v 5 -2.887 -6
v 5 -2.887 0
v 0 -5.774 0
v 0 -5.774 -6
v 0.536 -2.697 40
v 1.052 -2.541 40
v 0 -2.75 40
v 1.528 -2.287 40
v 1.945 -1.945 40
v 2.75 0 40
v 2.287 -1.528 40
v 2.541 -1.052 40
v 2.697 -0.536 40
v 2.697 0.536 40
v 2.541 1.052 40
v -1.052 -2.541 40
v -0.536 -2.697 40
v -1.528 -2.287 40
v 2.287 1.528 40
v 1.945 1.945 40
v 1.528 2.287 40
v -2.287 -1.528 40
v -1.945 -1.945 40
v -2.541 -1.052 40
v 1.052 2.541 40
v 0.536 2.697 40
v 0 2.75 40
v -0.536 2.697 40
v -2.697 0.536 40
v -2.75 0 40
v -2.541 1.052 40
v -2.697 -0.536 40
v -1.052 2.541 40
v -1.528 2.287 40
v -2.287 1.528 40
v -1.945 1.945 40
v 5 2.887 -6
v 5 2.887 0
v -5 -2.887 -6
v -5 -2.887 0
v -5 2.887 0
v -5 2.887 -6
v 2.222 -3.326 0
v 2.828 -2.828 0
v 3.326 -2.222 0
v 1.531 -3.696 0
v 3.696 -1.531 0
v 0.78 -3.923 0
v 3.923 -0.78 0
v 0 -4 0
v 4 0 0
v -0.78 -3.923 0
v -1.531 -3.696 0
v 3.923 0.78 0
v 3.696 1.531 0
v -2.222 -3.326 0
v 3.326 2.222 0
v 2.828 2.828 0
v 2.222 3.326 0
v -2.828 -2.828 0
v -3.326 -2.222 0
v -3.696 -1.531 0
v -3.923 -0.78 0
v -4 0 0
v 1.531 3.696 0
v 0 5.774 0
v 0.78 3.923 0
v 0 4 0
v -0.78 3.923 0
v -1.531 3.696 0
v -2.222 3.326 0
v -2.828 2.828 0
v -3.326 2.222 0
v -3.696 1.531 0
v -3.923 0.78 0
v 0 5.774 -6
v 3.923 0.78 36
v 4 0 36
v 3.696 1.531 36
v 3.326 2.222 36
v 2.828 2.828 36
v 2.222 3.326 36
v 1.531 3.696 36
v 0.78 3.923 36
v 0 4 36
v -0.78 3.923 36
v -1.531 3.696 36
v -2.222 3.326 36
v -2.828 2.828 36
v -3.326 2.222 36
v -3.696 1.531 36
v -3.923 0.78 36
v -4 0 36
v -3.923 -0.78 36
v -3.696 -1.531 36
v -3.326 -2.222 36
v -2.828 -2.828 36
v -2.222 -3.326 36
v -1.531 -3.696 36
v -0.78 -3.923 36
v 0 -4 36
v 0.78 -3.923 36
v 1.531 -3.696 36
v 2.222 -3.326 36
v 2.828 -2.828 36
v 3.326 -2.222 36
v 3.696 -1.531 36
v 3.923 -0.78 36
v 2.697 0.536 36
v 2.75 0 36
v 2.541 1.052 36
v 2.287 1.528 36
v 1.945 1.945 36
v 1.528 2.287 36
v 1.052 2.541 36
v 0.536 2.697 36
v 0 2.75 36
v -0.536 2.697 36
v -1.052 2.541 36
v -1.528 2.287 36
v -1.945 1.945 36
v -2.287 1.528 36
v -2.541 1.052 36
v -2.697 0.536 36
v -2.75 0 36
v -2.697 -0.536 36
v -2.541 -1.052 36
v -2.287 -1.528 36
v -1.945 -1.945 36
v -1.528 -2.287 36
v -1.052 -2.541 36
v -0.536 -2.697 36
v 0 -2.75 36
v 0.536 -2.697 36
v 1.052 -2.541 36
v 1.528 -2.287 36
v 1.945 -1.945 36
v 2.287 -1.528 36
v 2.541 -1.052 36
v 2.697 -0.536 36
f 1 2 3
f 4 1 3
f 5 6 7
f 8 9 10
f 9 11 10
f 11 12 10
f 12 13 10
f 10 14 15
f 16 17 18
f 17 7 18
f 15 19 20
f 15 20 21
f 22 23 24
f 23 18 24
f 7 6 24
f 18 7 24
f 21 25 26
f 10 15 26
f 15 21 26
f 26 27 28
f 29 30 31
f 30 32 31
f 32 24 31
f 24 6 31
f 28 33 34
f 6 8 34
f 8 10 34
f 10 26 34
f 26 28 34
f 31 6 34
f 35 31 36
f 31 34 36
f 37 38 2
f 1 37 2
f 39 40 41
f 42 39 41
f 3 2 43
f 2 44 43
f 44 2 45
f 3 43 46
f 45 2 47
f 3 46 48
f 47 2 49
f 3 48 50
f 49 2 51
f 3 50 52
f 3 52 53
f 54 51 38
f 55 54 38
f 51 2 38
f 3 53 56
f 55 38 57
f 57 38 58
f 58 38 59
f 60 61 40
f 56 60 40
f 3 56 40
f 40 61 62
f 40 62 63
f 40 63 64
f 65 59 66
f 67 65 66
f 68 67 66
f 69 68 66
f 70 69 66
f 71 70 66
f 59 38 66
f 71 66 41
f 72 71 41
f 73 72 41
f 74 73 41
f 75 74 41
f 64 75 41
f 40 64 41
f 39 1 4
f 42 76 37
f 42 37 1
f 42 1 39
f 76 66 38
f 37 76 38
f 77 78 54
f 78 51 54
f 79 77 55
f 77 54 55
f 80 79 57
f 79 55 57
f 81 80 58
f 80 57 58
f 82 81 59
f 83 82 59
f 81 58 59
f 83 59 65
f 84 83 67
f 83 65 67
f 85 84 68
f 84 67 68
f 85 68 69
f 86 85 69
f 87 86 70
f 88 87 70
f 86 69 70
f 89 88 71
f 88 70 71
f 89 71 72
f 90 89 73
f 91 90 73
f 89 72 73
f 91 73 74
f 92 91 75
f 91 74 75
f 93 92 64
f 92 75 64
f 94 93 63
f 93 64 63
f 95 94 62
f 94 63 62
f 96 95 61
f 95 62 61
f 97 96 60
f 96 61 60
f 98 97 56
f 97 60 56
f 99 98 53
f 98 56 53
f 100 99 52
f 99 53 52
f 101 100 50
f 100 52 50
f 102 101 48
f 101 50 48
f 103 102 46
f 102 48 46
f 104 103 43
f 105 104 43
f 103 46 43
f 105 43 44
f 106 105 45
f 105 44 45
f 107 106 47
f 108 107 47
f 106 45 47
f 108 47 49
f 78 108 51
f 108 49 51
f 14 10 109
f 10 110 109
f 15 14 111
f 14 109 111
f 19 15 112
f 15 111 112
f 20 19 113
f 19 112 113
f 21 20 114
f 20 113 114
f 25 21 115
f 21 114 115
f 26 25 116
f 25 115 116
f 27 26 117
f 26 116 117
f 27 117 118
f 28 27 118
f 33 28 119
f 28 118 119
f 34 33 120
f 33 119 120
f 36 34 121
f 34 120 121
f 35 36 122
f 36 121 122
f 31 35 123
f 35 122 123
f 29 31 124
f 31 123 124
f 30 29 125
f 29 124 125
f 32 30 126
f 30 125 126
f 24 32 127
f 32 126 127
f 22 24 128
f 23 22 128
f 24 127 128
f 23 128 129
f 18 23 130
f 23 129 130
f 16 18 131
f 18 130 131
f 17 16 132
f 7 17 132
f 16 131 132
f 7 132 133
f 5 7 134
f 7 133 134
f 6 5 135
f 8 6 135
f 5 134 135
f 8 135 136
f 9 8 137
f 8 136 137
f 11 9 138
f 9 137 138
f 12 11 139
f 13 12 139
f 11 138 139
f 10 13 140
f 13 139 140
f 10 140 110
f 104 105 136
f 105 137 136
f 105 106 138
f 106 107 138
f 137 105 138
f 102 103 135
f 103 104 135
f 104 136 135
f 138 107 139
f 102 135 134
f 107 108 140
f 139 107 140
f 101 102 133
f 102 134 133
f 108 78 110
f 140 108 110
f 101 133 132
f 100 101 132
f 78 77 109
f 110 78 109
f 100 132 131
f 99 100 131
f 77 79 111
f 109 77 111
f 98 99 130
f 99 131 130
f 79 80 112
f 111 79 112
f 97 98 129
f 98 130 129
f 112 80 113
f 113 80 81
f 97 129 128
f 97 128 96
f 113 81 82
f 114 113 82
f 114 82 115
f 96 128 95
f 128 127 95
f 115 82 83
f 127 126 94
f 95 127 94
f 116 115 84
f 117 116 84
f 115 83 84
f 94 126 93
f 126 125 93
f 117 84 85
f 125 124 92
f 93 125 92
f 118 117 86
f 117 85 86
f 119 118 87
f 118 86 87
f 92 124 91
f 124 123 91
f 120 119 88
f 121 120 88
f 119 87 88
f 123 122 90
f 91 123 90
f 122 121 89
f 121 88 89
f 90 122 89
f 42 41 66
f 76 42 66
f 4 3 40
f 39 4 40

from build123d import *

# Parameters (mm, degrees)
BOSS_EXTRUDE1_DEPTH = 6


with BuildPart() as part:
    # Sketch1 → Base-Revolve (revolve)
    with BuildSketch(Plane(origin=(0, 0, 0), x_dir=(1, 0, 0), z_dir=(0, 1, 0))):
        Polygon((0, 0), (0, -40), (2.75, -40), (2.75, -36), (4, -36), (4, 0), align=None)
    revolve(axis=Axis((0, 0, -1.187299328), (0, 0, 1)))

    # Sketch2 → Boss-Extrude1 (add)
    with BuildSketch(Plane(origin=(0, 0, 0), x_dir=(-1, 0, 0), z_dir=(0, 0, -1))):
        Polygon((5, -2.886751346), (5, 2.886751346), (0, 5.773502692), (-5, 2.886751346), (-5, -2.886751346), (0, -5.773502692), align=None)
    extrude(amount=BOSS_EXTRUDE1_DEPTH)


solid = part.part
